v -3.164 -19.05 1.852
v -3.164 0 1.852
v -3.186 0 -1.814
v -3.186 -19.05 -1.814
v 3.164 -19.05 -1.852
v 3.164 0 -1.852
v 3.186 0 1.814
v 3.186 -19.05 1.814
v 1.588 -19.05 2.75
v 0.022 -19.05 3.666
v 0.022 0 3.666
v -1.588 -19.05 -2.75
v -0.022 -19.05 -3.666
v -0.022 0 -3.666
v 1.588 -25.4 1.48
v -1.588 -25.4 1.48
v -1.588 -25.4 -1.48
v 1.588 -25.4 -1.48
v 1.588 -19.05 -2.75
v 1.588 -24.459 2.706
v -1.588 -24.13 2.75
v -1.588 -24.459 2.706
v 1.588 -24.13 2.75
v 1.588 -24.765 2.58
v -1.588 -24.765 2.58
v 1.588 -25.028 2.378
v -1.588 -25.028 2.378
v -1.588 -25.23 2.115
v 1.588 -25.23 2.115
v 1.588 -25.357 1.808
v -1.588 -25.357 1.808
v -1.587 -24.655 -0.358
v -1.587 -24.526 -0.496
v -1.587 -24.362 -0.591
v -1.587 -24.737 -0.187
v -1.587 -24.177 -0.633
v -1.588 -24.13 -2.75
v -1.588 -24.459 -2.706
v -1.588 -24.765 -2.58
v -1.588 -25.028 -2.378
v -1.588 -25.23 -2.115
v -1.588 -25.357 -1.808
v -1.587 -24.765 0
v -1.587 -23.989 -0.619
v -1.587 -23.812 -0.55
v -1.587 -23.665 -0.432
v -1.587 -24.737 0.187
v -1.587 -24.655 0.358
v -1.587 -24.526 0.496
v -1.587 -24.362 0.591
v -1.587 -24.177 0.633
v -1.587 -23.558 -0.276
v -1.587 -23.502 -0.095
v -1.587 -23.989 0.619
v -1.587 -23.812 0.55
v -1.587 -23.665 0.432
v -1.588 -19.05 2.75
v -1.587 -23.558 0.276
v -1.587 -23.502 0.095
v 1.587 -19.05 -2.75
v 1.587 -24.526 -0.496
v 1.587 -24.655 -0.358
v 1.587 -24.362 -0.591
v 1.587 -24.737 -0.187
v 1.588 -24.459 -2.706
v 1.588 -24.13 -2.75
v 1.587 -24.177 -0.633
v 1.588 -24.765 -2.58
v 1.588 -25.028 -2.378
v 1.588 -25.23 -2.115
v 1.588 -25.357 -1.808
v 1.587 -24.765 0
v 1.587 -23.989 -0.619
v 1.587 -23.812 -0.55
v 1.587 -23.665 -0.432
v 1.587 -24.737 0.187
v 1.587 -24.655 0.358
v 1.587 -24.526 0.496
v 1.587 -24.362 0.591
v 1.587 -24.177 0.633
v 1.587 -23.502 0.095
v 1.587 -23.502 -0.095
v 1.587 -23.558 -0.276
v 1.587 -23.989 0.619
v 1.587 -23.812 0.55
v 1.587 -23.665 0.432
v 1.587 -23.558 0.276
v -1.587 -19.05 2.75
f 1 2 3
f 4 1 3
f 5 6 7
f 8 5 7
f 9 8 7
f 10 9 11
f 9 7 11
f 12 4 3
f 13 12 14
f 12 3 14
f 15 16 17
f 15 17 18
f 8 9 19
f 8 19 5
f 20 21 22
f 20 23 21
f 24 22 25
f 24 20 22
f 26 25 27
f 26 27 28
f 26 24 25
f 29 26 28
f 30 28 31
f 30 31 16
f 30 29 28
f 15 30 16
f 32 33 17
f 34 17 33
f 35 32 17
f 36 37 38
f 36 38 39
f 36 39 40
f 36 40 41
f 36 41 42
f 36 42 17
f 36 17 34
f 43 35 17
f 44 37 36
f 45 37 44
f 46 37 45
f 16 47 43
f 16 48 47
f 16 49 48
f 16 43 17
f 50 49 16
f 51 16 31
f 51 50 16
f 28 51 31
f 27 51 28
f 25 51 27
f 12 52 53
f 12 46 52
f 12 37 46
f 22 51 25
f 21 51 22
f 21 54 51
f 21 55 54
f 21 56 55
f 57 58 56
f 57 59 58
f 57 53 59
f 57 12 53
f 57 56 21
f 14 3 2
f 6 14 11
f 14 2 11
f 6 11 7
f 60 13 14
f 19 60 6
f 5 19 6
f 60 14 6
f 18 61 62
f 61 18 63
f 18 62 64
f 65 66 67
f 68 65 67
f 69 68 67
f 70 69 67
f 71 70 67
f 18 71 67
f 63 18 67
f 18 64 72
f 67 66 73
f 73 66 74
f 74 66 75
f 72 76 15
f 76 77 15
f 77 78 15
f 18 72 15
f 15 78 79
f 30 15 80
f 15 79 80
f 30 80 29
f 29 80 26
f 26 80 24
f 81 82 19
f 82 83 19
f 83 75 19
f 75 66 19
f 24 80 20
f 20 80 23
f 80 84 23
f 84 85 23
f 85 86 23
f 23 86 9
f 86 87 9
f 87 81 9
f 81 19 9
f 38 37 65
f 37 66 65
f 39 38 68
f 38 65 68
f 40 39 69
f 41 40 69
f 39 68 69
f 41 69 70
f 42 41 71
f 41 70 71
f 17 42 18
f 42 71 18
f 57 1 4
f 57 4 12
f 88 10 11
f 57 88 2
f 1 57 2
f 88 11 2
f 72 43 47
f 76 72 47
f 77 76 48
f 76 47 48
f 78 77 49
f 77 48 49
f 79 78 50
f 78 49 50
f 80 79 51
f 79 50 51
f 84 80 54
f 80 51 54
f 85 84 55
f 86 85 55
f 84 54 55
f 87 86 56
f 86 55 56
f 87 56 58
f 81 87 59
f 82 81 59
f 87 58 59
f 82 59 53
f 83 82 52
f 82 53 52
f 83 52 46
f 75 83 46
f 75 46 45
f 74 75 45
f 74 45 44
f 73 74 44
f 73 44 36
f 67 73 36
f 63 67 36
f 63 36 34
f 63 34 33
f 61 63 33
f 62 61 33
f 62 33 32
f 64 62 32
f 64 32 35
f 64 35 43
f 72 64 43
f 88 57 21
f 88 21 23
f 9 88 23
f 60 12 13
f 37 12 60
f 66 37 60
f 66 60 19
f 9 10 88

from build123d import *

# Parameters (mm, degrees)
F1_DEPTH = 19.05
F2_W     = 3.175
F2_H     = 5.499398
F3_DEPTH = 6.35
F4_R     = 1.27
F6_D     = 1.27
F6_DEPTH = 25.4


with BuildPart() as f1:
    # F0 (on Front) → F1 (new body)
    with BuildSketch(Plane.XZ):
        Polygon((3.186096, 1.813733), (0.022309, 3.666106), (-3.163787, 1.852373), (-3.186096, -1.813733), (-0.022309, -3.666106), (3.163787, -1.852373), align=None)
    extrude(amount=F1_DEPTH)

    # F2 (on face) → F3 (join)
    with BuildSketch(Plane.XZ.offset(19.05)):
        Rectangle(F2_W, F2_H)
    extrude(amount=F3_DEPTH)

    # F4
    f4_edges = [f1.edges().sort_by_distance(p)[0] for p in [
        (0, -25.4, 2.749699),
        (0, -25.4, -2.749699),
    ]]
    fillet(f4_edges, radius=F4_R)

    # F6
    with Locations(Plane.YZ.offset(1.5875)):
        with Locations((-24.13, 0)):
            Hole(F6_D / 2, depth=F6_DEPTH)


solid = f1.part
